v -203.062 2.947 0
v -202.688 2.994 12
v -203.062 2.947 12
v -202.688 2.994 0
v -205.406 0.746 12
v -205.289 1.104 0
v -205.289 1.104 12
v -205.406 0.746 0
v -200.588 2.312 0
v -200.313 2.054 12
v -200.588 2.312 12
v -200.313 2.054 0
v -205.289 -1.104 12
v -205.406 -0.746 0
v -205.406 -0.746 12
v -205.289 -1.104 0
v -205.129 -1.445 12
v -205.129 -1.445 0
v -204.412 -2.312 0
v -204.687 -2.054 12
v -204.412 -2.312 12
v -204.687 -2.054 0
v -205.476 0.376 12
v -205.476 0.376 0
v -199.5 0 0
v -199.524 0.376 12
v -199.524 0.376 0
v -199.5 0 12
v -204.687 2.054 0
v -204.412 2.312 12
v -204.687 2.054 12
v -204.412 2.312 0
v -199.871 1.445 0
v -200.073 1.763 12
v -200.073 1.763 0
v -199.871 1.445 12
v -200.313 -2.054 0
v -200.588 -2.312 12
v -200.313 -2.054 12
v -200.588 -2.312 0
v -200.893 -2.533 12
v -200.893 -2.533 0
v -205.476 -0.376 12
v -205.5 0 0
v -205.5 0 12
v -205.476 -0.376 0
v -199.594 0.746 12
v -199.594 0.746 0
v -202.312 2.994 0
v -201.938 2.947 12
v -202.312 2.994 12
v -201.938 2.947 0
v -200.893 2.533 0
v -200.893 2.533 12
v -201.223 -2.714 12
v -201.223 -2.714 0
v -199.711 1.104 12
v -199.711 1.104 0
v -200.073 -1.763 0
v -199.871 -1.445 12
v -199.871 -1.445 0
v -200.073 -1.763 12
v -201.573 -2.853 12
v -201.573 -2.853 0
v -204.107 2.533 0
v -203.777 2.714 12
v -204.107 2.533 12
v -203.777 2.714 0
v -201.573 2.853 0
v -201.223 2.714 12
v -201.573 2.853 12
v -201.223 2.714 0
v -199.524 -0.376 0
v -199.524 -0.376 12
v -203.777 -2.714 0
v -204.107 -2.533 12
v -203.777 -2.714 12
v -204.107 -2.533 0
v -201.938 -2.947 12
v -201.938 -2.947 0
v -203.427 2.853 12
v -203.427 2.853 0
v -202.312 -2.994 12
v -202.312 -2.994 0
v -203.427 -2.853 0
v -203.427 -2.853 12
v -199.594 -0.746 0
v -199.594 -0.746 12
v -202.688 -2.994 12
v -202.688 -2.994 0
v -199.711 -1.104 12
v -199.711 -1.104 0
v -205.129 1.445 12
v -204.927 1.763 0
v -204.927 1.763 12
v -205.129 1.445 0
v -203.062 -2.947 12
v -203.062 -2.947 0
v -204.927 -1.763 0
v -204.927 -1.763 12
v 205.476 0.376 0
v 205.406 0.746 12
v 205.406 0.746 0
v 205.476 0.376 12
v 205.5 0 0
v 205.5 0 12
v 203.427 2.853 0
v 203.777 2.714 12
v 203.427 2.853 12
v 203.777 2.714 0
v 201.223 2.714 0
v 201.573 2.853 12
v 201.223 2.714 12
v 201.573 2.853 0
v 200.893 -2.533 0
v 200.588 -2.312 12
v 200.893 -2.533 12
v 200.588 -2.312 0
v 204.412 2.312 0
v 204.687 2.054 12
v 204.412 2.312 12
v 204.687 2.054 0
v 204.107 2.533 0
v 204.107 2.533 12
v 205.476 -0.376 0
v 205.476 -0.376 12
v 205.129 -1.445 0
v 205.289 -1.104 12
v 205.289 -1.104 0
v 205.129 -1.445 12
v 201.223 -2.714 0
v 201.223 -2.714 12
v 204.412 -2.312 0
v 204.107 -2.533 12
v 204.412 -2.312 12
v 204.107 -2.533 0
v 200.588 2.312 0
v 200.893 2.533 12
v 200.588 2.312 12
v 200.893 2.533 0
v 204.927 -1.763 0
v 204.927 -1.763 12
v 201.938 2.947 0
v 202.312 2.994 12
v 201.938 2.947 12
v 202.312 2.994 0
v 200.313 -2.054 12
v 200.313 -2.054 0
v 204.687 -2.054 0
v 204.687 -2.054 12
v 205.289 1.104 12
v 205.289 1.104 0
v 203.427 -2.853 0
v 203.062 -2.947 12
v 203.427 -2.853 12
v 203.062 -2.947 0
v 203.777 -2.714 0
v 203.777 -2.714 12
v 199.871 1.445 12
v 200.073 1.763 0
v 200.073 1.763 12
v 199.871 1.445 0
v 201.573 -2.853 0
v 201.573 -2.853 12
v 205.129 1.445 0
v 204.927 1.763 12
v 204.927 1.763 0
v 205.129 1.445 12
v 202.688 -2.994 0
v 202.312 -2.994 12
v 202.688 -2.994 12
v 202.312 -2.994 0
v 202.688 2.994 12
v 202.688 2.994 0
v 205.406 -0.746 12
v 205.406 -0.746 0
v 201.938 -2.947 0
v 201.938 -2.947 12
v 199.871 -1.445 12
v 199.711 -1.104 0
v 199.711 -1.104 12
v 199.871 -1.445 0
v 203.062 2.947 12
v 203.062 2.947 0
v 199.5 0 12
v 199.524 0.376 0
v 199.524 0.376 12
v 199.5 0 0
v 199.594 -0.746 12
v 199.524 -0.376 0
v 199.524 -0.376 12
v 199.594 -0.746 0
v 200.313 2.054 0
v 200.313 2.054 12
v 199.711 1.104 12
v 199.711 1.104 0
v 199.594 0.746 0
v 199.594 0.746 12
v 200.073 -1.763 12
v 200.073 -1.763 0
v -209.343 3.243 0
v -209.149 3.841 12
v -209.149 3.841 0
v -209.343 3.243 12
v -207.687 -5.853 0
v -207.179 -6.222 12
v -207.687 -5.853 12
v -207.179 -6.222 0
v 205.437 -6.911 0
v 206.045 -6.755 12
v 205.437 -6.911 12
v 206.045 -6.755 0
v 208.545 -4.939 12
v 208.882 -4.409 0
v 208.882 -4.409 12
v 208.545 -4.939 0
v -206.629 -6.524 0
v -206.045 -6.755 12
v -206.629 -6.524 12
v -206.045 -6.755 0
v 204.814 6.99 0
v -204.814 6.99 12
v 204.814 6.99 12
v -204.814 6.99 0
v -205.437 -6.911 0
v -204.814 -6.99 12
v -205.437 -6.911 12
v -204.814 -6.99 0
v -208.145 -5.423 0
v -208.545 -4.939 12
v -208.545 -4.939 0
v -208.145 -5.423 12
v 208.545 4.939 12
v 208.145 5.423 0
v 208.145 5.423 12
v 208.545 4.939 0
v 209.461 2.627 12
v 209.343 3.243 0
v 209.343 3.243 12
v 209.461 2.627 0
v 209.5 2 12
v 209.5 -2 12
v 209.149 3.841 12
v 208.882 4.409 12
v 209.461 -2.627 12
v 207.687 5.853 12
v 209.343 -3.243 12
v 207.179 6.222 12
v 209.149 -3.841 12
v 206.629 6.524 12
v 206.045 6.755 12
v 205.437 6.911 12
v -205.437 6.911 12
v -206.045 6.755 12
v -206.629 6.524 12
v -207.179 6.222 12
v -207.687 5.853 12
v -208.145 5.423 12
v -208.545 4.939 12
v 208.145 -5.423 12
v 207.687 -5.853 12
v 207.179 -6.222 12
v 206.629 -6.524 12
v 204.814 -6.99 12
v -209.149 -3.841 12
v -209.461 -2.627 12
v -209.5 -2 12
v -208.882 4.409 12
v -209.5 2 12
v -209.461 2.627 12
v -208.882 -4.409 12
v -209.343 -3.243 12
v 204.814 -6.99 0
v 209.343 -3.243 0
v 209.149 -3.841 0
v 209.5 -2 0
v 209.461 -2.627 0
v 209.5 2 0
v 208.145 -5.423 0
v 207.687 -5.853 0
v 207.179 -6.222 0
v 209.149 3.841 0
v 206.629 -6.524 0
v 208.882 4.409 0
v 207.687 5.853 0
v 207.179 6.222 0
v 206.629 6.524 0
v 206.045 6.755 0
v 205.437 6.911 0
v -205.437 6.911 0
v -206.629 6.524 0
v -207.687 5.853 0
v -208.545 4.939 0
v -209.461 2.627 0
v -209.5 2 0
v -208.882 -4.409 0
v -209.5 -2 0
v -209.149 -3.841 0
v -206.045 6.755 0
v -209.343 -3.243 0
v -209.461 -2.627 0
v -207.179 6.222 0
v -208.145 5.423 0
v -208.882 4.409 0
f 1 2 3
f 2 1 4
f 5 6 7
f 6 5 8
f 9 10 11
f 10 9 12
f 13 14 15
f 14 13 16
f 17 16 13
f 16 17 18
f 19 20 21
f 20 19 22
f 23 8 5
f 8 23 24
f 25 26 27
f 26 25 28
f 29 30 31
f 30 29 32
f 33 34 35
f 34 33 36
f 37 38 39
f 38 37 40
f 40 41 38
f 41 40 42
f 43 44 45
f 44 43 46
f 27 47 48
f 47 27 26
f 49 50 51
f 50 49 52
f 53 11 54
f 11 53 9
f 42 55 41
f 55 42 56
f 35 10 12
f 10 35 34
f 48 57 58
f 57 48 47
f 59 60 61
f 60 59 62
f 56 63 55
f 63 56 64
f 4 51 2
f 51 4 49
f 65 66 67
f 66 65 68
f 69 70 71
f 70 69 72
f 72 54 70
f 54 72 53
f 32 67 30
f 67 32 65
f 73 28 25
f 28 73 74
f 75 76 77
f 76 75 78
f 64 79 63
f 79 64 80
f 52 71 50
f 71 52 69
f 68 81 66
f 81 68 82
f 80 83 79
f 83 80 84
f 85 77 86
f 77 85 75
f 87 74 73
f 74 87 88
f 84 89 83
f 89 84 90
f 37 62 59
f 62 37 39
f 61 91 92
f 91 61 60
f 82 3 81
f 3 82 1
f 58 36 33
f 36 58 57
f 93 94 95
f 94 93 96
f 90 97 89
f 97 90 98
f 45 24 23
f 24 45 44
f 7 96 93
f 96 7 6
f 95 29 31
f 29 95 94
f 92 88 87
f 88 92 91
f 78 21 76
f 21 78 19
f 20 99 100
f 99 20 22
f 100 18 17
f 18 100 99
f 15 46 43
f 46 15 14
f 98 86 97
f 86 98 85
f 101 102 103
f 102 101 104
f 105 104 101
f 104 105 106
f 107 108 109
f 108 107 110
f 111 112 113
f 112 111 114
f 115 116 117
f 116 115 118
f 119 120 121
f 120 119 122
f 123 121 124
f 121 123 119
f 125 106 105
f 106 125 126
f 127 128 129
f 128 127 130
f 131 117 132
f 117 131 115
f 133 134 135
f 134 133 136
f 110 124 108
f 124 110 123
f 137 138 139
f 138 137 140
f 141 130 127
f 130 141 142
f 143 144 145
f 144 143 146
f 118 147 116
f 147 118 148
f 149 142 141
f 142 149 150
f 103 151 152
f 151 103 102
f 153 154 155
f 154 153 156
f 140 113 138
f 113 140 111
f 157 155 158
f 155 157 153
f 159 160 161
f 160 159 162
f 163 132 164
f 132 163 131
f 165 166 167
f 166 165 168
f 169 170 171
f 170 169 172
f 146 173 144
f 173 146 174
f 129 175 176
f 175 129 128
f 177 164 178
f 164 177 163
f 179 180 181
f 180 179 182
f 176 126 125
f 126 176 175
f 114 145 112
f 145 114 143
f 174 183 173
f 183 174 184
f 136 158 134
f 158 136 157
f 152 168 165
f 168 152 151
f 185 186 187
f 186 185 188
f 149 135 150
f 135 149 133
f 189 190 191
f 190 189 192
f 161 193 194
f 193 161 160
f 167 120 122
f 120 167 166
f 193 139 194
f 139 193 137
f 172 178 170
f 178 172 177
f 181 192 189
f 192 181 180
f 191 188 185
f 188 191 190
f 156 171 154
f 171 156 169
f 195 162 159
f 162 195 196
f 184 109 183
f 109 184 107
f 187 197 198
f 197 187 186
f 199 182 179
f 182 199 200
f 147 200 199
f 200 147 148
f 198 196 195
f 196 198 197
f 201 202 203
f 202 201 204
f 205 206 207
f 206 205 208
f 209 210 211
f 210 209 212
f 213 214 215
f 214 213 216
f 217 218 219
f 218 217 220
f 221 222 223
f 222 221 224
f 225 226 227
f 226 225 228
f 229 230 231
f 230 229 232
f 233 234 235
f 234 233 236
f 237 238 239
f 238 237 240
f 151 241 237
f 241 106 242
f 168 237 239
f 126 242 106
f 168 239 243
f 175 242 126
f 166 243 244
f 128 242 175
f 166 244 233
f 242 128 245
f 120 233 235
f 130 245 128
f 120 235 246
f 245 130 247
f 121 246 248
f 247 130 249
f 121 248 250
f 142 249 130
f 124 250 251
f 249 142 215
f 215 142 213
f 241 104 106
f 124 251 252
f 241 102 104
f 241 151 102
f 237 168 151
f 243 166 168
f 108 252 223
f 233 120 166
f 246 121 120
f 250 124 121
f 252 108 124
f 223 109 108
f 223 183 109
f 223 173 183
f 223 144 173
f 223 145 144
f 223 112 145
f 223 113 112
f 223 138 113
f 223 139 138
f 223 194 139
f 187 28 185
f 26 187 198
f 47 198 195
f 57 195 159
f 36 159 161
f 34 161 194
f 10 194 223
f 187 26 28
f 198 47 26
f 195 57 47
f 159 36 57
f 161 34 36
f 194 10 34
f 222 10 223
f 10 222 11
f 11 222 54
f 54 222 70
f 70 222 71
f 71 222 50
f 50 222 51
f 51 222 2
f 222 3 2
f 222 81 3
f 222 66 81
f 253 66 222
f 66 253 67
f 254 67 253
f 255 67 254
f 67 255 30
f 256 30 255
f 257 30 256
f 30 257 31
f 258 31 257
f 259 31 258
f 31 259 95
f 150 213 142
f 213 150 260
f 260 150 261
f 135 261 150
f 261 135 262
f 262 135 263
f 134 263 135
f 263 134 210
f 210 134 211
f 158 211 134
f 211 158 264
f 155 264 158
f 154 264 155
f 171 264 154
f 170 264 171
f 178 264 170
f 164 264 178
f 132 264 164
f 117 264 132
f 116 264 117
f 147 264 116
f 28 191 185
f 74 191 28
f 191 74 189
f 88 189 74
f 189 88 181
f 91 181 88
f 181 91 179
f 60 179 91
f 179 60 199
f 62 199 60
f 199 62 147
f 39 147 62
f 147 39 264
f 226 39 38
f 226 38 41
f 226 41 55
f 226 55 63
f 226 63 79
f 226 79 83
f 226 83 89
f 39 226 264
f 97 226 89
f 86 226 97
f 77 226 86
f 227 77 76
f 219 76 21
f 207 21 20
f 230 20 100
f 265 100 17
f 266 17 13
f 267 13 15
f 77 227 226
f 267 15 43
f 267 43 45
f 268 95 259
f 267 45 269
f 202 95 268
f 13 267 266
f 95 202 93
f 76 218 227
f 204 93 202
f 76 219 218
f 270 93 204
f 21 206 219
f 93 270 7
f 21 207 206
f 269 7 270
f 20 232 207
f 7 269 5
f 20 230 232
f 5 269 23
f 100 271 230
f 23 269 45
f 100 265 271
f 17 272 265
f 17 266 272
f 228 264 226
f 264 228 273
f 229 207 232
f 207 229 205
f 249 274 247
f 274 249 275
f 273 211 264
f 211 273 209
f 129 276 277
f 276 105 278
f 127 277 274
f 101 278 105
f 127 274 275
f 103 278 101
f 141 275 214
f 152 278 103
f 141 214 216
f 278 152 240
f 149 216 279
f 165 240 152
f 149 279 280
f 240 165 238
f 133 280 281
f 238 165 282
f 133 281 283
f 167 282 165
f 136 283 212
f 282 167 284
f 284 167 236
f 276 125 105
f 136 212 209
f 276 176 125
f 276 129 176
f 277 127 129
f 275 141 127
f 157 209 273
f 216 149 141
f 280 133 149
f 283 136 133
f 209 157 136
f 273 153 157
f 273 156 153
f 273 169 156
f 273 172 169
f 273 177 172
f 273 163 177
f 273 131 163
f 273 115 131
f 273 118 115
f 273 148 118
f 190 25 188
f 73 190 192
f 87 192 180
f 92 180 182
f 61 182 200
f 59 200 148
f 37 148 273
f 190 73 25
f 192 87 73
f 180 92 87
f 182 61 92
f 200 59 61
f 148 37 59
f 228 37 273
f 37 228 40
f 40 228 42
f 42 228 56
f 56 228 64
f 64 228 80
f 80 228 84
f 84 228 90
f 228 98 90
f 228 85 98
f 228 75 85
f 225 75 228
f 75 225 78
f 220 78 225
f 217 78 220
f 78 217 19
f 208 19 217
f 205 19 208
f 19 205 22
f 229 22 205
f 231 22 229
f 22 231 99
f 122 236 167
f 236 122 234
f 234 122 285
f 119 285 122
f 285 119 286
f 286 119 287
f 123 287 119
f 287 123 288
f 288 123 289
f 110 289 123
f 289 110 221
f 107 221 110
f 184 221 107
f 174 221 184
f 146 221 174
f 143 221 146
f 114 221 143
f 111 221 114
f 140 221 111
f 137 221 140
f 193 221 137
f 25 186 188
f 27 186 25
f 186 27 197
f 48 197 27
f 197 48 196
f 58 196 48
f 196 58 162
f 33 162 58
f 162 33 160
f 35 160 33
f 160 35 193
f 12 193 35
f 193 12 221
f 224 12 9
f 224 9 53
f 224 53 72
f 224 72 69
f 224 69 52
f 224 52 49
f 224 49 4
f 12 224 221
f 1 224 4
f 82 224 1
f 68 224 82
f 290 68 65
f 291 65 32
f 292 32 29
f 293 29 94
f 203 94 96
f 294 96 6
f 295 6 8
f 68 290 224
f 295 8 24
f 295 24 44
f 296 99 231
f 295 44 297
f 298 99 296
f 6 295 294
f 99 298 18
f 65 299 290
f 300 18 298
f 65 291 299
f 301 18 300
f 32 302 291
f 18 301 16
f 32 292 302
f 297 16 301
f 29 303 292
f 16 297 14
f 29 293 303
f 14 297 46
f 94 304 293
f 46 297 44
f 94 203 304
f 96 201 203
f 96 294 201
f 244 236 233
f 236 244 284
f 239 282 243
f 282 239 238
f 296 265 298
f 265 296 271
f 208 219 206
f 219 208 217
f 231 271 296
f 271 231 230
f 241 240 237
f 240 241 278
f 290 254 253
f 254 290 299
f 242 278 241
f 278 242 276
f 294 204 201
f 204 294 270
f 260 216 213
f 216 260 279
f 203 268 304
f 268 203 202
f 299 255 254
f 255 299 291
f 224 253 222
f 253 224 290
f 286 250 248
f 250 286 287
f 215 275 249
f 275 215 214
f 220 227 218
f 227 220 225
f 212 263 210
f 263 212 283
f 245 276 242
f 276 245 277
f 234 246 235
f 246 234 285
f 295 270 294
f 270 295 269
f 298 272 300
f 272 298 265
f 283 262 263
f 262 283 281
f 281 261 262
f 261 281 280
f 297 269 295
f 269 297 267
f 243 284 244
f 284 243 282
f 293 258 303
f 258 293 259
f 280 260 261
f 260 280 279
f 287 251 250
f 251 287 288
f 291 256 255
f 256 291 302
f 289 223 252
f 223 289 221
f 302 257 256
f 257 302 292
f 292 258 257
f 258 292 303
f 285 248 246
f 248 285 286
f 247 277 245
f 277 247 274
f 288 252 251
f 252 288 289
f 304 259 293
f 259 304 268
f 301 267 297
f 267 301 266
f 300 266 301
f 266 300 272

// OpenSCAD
$fn = 50;


difference() {
	union() {
		hull() {
			translate(v = [-204.5000000000, 2.0000000000, 0]) {
				cylinder(h = 12, r = 5);
			}
			translate(v = [204.5000000000, 2.0000000000, 0]) {
				cylinder(h = 12, r = 5);
			}
			translate(v = [-204.5000000000, -2.0000000000, 0]) {
				cylinder(h = 12, r = 5);
			}
			translate(v = [204.5000000000, -2.0000000000, 0]) {
				cylinder(h = 12, r = 5);
			}
		}
	}
	union() {
		translate(v = [-202.5000000000, 0.0000000000, -100.0000000000]) {
			cylinder(h = 200, r = 3.0000000000);
		}
		translate(v = [-202.5000000000, 0.0000000000, -100.0000000000]) {
			cylinder(h = 200, r = 3.0000000000);
		}
		translate(v = [202.5000000000, 0.0000000000, -100.0000000000]) {
			cylinder(h = 200, r = 3.0000000000);
		}
		translate(v = [202.5000000000, 0.0000000000, -100.0000000000]) {
			cylinder(h = 200, r = 3.0000000000);
		}
	}
}
